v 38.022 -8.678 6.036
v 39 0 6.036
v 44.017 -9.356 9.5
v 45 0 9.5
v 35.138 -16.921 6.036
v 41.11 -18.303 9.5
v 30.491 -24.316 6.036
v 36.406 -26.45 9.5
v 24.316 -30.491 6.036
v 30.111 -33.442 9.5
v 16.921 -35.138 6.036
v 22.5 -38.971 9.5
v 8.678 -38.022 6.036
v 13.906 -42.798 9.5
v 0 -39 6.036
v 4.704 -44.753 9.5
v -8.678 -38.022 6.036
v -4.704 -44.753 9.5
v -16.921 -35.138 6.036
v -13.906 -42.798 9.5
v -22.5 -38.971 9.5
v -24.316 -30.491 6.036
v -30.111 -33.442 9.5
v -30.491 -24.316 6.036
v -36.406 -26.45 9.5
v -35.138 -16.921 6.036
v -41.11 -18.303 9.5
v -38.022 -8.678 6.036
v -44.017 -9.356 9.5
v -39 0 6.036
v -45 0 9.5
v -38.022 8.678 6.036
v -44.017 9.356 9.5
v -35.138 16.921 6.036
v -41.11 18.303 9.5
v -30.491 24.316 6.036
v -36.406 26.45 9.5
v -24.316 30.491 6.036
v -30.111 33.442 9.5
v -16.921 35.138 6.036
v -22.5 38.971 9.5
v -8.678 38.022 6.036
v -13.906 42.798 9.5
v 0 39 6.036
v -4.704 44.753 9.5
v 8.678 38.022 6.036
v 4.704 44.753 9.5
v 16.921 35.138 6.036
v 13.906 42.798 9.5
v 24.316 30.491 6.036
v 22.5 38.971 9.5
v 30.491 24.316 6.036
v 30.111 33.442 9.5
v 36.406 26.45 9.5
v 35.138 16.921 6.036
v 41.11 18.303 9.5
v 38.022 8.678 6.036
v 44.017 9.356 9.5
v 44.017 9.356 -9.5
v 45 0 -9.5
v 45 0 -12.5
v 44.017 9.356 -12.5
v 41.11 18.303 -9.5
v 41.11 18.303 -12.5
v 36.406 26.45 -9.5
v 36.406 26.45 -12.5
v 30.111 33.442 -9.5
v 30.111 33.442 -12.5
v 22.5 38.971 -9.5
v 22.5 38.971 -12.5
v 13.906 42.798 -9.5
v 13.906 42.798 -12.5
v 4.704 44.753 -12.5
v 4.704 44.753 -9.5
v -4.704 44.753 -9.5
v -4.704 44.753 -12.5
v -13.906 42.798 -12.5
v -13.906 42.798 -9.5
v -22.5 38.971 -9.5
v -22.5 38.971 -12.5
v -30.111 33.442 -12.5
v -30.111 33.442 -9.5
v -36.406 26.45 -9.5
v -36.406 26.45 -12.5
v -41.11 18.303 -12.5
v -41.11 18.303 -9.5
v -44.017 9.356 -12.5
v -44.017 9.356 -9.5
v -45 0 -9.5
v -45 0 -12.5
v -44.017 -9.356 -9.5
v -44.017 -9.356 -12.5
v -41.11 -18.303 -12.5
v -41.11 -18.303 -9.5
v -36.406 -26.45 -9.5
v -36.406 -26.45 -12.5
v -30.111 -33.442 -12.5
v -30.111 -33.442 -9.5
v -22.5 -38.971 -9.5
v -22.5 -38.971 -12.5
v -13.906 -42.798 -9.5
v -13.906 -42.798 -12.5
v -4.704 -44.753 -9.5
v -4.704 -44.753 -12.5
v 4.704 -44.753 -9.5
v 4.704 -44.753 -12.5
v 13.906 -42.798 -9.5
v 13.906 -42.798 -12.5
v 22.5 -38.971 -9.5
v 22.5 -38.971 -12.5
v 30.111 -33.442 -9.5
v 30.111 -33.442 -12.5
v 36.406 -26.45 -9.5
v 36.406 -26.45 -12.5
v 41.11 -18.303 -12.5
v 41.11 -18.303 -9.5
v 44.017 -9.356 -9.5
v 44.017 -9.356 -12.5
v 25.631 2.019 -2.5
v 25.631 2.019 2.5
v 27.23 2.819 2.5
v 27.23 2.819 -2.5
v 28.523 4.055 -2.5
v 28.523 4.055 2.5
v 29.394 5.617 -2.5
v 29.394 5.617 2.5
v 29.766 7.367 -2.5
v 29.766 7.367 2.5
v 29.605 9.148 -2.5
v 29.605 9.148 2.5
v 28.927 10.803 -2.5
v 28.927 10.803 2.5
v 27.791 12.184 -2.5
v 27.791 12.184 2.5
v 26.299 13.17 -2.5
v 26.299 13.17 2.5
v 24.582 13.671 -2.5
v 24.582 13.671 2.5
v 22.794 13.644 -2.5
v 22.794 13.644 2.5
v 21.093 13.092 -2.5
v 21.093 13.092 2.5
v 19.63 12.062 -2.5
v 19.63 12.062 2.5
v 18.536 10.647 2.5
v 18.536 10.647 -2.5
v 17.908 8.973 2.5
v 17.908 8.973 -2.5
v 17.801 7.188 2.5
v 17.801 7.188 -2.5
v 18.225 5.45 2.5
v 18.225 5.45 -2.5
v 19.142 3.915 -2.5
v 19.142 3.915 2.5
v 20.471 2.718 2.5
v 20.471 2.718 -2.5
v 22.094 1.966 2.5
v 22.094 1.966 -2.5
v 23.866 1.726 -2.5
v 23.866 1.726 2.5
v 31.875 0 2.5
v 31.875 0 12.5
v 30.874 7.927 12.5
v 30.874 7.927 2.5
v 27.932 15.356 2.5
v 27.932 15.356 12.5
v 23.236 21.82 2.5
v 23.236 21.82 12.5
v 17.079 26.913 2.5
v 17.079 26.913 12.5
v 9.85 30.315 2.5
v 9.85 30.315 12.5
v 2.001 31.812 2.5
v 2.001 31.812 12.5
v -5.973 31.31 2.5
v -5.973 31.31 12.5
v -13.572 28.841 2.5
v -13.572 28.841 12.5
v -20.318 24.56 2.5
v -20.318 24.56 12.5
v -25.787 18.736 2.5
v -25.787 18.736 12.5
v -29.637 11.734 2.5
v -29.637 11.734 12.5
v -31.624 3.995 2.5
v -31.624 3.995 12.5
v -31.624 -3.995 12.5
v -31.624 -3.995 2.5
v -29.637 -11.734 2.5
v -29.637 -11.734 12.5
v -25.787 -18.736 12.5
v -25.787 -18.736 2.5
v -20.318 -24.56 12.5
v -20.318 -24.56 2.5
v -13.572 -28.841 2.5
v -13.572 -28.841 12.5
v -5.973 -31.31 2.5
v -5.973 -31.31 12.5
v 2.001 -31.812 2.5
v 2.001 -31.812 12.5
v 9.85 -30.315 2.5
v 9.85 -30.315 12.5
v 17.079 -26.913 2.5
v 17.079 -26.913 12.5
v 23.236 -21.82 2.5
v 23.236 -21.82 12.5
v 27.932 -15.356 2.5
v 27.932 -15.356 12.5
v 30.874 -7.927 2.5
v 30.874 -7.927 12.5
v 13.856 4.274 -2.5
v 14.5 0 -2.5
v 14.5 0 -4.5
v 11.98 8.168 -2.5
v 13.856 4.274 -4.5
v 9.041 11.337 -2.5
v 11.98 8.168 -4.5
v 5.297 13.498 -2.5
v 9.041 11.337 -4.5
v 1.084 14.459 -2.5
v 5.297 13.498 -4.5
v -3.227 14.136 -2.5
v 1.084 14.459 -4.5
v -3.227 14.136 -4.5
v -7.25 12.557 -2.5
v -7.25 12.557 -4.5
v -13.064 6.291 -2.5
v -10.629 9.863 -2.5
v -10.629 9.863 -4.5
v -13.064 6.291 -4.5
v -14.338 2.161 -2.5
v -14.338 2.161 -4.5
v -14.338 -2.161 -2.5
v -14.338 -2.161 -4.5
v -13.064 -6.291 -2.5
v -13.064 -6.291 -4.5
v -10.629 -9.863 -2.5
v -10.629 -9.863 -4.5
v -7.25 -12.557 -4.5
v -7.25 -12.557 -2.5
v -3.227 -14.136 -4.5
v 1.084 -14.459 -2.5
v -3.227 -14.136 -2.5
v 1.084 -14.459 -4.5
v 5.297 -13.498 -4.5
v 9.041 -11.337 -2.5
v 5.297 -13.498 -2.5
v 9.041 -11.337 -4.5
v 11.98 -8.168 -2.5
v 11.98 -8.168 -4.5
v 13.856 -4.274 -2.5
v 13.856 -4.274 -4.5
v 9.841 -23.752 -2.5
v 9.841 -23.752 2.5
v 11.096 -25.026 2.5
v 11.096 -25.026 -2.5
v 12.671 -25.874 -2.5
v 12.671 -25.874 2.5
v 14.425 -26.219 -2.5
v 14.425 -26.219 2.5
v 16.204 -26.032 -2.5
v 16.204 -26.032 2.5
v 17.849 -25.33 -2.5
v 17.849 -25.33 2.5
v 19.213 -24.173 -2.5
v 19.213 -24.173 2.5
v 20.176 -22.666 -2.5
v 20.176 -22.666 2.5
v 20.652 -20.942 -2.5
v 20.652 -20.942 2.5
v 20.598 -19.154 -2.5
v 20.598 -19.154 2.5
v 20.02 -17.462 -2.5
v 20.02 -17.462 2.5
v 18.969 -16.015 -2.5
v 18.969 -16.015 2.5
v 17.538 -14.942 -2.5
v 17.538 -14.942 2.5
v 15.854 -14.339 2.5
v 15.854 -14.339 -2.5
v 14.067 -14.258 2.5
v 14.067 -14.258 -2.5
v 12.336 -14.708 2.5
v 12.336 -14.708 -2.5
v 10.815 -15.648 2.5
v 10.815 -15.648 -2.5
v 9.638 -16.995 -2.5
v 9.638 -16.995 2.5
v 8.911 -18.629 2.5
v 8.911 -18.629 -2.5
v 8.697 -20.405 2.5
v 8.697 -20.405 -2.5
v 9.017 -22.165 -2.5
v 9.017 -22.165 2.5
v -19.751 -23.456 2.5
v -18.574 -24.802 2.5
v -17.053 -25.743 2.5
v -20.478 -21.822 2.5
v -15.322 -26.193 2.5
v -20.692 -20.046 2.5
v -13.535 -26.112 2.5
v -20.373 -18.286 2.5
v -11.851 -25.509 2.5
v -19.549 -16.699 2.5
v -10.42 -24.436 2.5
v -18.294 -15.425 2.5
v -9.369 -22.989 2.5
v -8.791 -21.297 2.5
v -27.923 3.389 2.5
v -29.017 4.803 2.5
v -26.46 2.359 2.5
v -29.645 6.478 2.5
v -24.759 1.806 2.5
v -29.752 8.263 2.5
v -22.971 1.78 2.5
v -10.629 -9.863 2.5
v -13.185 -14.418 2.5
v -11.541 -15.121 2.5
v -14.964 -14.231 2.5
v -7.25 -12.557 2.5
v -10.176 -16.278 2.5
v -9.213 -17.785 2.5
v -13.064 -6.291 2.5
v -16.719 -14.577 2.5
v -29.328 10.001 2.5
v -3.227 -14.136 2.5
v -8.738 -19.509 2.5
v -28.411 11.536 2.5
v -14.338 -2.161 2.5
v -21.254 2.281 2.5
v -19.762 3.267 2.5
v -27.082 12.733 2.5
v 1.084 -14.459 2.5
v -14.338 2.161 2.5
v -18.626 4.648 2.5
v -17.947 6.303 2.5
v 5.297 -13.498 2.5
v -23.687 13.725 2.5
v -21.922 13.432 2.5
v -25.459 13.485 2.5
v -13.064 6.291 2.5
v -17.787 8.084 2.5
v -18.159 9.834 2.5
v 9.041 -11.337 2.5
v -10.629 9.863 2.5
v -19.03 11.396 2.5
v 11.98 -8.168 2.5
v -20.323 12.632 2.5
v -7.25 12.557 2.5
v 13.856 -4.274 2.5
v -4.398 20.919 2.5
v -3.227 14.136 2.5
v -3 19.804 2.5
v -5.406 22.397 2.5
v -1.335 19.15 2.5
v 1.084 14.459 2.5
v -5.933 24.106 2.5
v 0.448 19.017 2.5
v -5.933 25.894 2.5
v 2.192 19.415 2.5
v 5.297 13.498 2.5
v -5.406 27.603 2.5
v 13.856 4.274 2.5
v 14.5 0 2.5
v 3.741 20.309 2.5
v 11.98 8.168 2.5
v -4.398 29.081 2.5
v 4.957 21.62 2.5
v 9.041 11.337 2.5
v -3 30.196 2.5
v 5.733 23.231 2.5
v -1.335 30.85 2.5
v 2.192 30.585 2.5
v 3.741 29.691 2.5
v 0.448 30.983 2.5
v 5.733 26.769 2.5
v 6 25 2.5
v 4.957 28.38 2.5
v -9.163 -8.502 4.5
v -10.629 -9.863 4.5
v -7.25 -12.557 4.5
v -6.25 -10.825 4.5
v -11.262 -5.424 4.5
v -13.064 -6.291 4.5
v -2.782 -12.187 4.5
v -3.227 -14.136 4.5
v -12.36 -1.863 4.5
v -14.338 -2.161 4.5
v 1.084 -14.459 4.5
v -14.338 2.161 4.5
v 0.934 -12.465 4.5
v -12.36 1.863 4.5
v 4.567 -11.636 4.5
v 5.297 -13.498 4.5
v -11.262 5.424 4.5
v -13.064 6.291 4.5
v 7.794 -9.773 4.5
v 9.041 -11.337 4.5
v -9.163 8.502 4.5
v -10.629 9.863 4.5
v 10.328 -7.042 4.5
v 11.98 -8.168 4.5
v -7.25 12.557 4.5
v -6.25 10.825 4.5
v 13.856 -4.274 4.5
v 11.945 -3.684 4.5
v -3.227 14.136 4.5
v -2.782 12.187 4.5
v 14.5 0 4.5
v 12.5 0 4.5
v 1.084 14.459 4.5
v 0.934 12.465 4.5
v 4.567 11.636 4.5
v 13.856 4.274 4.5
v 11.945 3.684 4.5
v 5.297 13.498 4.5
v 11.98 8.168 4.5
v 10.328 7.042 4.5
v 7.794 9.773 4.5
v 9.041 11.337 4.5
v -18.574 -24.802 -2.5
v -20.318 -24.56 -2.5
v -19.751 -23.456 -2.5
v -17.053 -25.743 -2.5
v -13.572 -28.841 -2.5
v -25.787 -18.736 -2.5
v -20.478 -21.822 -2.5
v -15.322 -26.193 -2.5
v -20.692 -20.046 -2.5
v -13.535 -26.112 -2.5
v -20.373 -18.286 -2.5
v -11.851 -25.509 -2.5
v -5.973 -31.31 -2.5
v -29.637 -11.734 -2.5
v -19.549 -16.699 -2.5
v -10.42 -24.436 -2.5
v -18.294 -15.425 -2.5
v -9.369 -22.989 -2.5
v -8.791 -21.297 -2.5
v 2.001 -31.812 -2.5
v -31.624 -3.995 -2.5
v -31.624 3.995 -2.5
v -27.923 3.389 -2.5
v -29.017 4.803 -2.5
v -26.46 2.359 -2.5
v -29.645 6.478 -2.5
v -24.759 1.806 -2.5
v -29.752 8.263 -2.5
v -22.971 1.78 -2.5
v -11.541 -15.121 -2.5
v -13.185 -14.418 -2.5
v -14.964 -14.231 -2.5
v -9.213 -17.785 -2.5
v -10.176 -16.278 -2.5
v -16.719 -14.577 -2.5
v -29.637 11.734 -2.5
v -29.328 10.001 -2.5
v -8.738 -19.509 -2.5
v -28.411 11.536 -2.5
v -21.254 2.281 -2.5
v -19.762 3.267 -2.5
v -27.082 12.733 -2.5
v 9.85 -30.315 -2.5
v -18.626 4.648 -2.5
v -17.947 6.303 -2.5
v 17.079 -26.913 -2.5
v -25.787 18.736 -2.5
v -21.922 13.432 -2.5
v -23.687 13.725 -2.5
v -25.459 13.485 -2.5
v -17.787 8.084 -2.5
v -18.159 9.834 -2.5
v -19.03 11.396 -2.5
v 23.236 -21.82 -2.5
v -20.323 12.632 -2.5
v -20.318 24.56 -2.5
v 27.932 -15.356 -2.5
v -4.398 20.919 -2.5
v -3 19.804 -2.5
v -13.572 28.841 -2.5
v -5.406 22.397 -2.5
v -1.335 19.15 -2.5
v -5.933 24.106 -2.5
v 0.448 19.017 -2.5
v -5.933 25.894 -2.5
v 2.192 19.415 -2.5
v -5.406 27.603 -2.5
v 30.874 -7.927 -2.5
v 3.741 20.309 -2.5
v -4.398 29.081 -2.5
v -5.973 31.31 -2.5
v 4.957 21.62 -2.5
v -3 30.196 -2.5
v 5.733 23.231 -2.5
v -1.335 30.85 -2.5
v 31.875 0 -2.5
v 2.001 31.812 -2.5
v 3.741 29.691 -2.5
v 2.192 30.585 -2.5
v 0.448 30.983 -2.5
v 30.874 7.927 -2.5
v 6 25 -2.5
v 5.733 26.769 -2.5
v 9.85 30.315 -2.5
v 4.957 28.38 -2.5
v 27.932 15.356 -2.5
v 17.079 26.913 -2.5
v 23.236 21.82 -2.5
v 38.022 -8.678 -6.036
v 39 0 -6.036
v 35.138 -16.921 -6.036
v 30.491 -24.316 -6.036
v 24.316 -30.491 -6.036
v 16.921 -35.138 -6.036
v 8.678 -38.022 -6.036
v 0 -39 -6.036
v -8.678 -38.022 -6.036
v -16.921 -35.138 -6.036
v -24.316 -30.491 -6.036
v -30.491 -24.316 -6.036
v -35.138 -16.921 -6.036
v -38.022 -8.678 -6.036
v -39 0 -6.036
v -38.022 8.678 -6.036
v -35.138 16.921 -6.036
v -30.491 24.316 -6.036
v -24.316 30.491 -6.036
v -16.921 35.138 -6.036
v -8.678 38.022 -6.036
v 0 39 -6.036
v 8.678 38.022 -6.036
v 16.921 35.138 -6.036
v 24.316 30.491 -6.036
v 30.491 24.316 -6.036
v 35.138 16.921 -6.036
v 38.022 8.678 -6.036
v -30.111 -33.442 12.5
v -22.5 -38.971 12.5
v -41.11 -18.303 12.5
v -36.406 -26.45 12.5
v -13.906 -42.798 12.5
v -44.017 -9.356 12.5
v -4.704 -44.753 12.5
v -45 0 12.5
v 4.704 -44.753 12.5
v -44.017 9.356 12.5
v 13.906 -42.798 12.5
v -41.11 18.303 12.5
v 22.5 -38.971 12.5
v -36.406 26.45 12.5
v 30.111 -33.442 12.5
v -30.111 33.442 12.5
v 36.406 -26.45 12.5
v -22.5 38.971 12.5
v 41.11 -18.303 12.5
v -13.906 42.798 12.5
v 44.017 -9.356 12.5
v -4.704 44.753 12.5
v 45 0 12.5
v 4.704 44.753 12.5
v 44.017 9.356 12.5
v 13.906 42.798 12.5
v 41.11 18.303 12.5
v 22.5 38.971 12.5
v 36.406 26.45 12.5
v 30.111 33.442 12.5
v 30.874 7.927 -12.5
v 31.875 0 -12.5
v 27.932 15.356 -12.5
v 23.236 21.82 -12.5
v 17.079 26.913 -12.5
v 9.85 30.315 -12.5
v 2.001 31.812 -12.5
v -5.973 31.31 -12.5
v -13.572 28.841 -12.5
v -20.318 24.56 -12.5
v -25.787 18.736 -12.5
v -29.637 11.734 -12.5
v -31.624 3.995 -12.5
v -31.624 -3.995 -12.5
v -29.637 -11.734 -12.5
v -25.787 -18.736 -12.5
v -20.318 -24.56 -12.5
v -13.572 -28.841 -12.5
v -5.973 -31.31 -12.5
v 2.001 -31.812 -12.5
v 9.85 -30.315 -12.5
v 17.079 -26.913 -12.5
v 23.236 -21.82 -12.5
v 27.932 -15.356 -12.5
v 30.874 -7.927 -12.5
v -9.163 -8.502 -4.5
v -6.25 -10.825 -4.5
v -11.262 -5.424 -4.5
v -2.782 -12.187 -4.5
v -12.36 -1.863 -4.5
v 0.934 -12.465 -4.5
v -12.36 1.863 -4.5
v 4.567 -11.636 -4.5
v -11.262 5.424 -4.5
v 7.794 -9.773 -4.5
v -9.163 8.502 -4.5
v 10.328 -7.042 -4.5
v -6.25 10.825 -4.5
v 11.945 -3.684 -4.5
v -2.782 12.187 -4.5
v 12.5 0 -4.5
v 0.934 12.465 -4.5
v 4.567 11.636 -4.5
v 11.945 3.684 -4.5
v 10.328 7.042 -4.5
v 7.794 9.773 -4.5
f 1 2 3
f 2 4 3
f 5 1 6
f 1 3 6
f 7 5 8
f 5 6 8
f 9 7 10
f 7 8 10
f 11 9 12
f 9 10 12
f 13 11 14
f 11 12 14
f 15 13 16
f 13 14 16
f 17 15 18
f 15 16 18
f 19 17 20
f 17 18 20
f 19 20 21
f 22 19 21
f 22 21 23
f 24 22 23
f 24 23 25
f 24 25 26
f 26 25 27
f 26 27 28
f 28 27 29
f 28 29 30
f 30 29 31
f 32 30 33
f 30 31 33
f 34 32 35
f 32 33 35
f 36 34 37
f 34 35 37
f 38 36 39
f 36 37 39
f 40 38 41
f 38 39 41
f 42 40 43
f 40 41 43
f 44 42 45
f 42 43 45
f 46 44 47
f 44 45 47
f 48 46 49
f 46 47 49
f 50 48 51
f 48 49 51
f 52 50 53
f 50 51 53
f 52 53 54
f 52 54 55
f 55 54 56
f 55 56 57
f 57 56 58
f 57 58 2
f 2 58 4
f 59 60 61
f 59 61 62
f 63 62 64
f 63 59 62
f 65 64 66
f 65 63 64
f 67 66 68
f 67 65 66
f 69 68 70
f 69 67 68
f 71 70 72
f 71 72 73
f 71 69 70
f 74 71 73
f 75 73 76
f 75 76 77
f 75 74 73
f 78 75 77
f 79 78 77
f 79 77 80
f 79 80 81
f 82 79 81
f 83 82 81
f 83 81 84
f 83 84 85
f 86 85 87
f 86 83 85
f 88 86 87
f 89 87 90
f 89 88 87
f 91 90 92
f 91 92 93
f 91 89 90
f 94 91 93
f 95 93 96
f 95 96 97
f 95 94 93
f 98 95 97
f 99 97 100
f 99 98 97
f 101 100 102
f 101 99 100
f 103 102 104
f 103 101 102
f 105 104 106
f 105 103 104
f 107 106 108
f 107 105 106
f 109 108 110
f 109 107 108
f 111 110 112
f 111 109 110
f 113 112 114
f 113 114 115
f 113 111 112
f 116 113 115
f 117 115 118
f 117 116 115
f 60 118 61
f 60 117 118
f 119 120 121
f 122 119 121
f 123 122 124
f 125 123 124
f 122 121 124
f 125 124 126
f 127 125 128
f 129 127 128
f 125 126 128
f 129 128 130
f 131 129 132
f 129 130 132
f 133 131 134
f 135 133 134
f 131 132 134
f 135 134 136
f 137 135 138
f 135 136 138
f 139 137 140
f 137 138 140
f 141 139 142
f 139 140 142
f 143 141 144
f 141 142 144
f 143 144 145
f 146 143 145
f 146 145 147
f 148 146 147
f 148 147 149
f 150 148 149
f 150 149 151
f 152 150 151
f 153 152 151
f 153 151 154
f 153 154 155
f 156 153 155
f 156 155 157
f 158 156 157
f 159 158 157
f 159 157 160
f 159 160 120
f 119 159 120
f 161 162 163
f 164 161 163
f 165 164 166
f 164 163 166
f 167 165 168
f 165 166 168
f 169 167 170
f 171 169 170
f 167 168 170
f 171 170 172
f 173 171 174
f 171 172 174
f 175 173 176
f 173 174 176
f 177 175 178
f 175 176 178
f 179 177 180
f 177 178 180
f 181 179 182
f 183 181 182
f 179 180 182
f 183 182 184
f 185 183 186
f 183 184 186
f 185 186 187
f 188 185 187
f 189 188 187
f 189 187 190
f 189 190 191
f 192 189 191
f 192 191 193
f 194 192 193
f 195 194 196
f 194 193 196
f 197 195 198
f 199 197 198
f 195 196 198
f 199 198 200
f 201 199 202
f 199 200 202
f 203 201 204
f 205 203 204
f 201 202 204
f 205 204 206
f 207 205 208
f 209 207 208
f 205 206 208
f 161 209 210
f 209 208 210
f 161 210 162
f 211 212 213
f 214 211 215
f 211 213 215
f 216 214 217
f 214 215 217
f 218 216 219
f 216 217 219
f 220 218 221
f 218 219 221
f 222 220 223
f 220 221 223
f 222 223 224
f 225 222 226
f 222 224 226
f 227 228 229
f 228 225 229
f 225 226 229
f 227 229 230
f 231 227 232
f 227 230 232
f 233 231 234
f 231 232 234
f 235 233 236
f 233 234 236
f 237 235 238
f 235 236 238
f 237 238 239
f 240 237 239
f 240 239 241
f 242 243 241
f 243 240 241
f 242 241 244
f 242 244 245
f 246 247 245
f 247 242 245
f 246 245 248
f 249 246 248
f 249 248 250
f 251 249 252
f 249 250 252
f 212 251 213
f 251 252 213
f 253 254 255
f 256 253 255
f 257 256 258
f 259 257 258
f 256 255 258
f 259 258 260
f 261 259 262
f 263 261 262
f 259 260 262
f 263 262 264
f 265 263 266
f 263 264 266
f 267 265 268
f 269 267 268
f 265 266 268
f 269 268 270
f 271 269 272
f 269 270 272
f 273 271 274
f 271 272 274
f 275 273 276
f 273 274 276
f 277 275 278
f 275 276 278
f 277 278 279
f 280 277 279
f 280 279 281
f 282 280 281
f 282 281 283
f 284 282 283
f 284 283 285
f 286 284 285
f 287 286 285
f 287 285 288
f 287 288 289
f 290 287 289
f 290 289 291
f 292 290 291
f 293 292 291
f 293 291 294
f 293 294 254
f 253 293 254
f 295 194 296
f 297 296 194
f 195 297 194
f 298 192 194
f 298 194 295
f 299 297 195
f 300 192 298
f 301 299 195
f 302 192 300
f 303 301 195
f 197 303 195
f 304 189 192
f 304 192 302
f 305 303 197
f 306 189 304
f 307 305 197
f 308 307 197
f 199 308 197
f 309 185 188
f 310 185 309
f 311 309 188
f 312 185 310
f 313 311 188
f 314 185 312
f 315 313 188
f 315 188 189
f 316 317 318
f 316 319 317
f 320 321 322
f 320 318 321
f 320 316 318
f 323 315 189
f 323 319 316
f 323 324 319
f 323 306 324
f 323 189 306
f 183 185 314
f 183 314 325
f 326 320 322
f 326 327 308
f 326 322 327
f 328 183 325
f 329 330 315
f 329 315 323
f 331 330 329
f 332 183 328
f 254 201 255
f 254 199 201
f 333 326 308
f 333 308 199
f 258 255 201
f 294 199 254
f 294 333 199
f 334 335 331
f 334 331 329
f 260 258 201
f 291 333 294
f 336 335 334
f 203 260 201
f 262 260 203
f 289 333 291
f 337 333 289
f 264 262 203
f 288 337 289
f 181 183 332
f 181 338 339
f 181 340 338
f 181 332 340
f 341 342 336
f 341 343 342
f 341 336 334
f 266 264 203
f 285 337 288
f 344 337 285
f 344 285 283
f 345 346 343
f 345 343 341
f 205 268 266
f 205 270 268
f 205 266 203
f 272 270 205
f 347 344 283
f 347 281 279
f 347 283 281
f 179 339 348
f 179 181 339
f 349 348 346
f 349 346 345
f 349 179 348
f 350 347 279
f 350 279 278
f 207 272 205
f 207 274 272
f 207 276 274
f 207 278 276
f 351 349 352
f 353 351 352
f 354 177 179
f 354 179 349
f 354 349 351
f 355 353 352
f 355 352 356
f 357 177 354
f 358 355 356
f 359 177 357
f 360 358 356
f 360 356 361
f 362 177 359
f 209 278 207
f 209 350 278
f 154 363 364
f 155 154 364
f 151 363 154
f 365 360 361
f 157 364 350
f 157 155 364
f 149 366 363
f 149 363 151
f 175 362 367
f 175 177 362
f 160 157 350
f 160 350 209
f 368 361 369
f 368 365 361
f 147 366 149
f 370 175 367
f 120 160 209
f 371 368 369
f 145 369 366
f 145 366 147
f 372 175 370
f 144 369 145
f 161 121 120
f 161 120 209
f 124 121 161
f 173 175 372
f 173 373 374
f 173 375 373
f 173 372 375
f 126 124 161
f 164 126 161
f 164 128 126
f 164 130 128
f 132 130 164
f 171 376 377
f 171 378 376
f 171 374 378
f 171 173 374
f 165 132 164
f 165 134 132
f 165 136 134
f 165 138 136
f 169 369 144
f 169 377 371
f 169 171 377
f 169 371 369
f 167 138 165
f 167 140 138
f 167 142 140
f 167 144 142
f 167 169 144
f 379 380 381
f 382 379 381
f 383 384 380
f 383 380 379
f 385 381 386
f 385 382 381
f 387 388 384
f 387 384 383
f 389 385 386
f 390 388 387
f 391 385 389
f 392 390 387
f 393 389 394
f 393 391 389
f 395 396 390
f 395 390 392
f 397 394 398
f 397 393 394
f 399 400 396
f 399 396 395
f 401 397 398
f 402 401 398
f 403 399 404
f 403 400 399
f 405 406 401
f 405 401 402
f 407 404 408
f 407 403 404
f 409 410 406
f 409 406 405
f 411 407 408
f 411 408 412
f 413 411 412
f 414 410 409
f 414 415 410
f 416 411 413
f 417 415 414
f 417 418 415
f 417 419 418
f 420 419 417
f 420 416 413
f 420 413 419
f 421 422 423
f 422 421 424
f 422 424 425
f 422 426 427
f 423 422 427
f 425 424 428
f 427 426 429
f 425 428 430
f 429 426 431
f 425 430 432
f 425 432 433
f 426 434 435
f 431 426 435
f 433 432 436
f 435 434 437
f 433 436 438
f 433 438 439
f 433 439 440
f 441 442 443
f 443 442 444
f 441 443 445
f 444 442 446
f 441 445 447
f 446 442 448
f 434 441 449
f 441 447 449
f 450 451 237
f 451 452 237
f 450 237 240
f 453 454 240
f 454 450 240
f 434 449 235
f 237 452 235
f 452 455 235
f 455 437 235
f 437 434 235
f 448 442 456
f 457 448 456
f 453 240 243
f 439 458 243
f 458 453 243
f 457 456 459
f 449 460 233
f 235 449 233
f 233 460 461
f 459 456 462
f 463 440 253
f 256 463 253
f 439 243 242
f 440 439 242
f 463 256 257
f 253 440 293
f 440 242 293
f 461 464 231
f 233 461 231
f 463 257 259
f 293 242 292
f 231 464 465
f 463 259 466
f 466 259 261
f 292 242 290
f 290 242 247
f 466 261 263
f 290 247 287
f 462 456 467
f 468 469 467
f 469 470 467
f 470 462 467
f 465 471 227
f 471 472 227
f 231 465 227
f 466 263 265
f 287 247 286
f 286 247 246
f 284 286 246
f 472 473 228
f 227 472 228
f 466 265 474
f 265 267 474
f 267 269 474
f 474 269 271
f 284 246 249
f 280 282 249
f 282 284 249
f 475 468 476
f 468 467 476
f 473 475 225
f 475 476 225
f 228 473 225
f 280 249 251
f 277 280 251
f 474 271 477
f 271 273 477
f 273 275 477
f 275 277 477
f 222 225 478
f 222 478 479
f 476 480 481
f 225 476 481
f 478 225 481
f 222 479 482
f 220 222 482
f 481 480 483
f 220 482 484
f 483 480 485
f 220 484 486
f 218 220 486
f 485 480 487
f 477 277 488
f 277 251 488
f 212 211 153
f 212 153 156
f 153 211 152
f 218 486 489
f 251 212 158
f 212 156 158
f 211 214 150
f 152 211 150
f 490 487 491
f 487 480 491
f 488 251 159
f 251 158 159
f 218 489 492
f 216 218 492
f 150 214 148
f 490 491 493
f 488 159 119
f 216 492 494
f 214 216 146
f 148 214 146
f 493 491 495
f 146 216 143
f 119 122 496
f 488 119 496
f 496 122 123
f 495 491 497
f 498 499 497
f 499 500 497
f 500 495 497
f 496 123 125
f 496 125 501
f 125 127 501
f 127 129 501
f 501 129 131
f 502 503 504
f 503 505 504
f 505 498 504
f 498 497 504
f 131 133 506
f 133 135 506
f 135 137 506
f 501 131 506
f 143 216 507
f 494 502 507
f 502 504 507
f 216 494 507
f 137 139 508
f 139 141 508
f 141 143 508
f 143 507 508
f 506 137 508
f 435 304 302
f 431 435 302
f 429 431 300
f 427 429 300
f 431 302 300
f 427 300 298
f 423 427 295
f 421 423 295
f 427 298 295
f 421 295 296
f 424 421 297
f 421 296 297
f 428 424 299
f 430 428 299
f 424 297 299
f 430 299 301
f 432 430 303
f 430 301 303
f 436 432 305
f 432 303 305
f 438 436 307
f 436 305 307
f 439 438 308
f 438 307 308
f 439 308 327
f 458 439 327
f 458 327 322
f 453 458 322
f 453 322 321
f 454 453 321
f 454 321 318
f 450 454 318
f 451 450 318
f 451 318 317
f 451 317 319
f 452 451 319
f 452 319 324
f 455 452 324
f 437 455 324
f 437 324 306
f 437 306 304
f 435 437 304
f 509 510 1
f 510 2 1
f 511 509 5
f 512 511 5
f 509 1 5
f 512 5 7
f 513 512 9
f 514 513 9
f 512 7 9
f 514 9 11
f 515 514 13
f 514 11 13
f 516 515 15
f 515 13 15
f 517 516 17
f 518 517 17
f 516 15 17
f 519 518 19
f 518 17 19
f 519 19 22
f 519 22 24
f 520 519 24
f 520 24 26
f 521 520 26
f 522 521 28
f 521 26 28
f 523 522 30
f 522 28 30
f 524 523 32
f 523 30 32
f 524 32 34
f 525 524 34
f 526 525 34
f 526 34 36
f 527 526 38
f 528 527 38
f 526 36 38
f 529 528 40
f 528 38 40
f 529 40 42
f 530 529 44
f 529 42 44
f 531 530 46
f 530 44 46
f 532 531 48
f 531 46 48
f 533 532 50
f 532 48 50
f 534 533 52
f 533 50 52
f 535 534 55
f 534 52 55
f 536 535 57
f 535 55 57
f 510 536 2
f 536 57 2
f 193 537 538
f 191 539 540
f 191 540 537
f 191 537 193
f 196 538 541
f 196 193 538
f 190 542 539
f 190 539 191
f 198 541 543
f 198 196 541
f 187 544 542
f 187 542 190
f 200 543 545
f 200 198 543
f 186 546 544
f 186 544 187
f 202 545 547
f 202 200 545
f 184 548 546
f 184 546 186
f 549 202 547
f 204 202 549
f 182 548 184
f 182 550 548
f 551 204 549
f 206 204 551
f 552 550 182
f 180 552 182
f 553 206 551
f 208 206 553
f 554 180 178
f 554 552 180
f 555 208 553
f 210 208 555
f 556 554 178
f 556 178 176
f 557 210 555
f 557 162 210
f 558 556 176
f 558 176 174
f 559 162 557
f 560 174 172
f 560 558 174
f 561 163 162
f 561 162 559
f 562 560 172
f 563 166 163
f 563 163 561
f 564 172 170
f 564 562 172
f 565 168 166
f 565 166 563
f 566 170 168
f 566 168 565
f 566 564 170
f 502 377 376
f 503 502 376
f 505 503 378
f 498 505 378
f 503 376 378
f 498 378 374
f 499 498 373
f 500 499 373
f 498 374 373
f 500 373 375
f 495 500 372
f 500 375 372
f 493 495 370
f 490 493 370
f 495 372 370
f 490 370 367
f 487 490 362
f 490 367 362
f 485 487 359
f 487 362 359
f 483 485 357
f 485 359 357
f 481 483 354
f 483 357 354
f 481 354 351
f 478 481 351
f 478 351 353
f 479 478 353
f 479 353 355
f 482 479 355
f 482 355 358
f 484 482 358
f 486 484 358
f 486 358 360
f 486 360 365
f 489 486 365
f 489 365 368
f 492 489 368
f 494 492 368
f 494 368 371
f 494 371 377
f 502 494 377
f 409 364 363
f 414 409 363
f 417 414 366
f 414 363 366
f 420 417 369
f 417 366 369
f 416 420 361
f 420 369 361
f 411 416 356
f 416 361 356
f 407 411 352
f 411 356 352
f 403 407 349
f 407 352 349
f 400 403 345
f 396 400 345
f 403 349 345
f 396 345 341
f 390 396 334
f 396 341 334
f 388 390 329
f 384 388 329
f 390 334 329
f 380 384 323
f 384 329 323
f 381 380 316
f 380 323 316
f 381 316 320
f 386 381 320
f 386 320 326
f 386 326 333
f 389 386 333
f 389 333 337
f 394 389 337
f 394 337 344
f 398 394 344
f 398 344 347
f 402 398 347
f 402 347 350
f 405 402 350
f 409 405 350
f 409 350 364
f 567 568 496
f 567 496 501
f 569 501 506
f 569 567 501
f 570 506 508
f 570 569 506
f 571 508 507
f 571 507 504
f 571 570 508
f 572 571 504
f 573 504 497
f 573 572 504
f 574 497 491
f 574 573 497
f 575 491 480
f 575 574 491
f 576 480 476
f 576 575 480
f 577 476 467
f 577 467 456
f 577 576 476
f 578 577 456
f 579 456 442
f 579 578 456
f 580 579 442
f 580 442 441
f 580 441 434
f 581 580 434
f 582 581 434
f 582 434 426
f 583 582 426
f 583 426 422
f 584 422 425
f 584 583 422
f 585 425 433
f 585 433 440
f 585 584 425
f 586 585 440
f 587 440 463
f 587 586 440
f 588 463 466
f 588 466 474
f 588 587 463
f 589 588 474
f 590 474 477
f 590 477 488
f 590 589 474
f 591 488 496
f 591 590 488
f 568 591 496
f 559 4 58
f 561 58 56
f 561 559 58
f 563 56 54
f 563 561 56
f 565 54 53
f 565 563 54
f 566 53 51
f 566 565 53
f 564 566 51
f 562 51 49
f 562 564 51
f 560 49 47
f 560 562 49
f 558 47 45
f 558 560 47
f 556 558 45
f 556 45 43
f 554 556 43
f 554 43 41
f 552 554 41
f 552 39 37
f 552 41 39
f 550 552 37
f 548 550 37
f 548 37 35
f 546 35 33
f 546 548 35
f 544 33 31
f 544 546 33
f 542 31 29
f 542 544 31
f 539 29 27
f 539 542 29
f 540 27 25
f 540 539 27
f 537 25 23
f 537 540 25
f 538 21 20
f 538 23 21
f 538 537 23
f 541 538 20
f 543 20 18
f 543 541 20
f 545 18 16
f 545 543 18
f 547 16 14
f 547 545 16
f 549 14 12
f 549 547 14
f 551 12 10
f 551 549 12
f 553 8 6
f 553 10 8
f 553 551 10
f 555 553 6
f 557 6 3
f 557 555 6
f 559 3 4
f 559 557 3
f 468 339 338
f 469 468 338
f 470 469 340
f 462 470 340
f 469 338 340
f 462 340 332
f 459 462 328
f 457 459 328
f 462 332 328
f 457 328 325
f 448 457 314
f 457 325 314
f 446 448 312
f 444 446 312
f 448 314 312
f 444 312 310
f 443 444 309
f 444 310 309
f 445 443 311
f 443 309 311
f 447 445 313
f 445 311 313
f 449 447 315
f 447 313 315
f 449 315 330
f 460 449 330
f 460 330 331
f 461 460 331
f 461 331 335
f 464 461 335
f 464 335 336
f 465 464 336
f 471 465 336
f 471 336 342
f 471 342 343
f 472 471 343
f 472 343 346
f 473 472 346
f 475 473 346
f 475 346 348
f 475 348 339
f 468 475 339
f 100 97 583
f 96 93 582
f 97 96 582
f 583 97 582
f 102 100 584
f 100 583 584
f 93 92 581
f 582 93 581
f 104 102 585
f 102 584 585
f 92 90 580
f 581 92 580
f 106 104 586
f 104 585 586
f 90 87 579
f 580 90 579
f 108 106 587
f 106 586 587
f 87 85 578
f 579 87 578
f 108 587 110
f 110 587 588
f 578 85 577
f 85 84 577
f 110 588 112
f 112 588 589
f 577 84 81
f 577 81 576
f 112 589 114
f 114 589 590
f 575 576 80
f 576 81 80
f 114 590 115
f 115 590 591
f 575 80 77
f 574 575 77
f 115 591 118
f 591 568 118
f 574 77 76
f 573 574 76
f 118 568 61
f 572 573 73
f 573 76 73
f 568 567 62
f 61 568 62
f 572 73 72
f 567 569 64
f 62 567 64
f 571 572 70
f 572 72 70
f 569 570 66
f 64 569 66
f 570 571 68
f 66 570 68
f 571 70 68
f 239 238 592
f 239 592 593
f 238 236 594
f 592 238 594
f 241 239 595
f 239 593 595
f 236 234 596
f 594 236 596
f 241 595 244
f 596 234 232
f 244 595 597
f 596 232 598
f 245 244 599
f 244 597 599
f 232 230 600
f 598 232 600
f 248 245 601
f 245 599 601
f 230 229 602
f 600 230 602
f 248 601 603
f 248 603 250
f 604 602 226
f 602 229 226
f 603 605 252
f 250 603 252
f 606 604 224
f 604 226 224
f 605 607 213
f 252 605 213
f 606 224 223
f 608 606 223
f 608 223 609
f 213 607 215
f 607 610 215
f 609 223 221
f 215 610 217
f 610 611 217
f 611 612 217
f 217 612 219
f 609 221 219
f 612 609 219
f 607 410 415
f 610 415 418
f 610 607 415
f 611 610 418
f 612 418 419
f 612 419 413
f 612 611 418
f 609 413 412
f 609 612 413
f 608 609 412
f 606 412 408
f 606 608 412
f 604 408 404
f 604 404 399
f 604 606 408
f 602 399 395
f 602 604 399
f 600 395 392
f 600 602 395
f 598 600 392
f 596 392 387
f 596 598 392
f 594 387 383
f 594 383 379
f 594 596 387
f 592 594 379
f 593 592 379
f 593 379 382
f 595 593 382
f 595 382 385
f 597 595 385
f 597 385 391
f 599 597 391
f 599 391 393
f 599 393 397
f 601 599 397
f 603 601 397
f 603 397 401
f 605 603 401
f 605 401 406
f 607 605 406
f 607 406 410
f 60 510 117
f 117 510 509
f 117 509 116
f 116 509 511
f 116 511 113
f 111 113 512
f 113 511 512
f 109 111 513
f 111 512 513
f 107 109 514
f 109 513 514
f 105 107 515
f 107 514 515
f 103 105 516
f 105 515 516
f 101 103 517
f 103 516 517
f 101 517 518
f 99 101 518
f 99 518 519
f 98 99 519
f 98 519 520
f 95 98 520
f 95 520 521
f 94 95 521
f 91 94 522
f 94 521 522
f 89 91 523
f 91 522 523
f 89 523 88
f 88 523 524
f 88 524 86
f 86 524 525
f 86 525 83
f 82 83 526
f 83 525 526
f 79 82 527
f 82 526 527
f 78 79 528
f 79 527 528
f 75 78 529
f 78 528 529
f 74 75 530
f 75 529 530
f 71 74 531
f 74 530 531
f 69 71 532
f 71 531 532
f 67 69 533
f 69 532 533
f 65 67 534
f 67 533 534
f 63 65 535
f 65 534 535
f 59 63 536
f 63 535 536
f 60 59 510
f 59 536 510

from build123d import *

# Parameters (mm, degrees)
SKETCH1_R                = 45
SKETCH1_R_2              = 12.5
BOSS_EXTRUDE1_DEPTH      = 12.5
SKETCH2_R                = 31.875
CUT_EXTRUDE1_DEPTH       = 10
SKETCH3_R                = 6
CUT_EXTRUDE2_DEPTH       = 66.383484153
CIRPATTERN1_COUNT        = 5
BOSS_EXTRUDE2_DEPTH      = 2
BOSS_EXTRUDE2_DEPTH_BACK = 7
SKETCH4_R                = 14.5
SKETCH4_R_2              = 12.5


with BuildPart() as part:
    # Sketch1 → Boss-Extrude1 (new, symmetric)
    with BuildSketch(Plane.XY):
        Circle(SKETCH1_R)
        Circle(SKETCH1_R_2, mode=Mode.SUBTRACT)
    extrude(amount=BOSS_EXTRUDE1_DEPTH, both=True)

    # Sketch2 → Cut-Extrude1 (cut)
    with BuildSketch(Plane.XY.offset(12.5)):
        Circle(SKETCH2_R)
    cut_extrude1 = extrude(amount=-CUT_EXTRUDE1_DEPTH, mode=Mode.SUBTRACT)

    # Mirror1: Cut-Extrude1 across plane
    add(cut_extrude1.mirror(Plane.XY), mode=Mode.SUBTRACT)

    # Sketch3 → Cut-Extrude2 (cut, through all)
    with BuildSketch(Plane.XY.offset(2.5)):
        with Locations((0, 25)):
            Circle(SKETCH3_R)
    cut_extrude2 = extrude(amount=-CUT_EXTRUDE2_DEPTH, mode=Mode.SUBTRACT)

    # CirPattern1: Cut-Extrude2 ×5 about axis
    cirpattern1_axis = Axis((0, 0, 0), (0, 0, 1))
    for i in range(1, CIRPATTERN1_COUNT):
        add(cut_extrude2.rotate(cirpattern1_axis, i * 360 / CIRPATTERN1_COUNT), mode=Mode.SUBTRACT)

    # Sketch4 → Boss-Extrude2 (add, two sides: drawn at the far end of the back side and taken through both)
    with BuildSketch(Plane.XY.offset(2.5).offset(-BOSS_EXTRUDE2_DEPTH_BACK)):
        Circle(SKETCH4_R)
        Circle(SKETCH4_R_2, mode=Mode.SUBTRACT)
    extrude(amount=BOSS_EXTRUDE2_DEPTH + BOSS_EXTRUDE2_DEPTH_BACK)

    # Sketch5 → Cut-Revolve1 (revolve, cut)
    with BuildSketch(Plane(origin=(0, 0, 0), x_dir=(1, 0, 0), z_dir=(0, 1, 0))):
        Polygon((45, 9.5), (39, 6.035898385), (39, -6.035898385), (45, -9.5), align=None)
    revolve(axis=Axis((0, 0, 0), (0, 0, -1)), mode=Mode.SUBTRACT)


solid = part.part
